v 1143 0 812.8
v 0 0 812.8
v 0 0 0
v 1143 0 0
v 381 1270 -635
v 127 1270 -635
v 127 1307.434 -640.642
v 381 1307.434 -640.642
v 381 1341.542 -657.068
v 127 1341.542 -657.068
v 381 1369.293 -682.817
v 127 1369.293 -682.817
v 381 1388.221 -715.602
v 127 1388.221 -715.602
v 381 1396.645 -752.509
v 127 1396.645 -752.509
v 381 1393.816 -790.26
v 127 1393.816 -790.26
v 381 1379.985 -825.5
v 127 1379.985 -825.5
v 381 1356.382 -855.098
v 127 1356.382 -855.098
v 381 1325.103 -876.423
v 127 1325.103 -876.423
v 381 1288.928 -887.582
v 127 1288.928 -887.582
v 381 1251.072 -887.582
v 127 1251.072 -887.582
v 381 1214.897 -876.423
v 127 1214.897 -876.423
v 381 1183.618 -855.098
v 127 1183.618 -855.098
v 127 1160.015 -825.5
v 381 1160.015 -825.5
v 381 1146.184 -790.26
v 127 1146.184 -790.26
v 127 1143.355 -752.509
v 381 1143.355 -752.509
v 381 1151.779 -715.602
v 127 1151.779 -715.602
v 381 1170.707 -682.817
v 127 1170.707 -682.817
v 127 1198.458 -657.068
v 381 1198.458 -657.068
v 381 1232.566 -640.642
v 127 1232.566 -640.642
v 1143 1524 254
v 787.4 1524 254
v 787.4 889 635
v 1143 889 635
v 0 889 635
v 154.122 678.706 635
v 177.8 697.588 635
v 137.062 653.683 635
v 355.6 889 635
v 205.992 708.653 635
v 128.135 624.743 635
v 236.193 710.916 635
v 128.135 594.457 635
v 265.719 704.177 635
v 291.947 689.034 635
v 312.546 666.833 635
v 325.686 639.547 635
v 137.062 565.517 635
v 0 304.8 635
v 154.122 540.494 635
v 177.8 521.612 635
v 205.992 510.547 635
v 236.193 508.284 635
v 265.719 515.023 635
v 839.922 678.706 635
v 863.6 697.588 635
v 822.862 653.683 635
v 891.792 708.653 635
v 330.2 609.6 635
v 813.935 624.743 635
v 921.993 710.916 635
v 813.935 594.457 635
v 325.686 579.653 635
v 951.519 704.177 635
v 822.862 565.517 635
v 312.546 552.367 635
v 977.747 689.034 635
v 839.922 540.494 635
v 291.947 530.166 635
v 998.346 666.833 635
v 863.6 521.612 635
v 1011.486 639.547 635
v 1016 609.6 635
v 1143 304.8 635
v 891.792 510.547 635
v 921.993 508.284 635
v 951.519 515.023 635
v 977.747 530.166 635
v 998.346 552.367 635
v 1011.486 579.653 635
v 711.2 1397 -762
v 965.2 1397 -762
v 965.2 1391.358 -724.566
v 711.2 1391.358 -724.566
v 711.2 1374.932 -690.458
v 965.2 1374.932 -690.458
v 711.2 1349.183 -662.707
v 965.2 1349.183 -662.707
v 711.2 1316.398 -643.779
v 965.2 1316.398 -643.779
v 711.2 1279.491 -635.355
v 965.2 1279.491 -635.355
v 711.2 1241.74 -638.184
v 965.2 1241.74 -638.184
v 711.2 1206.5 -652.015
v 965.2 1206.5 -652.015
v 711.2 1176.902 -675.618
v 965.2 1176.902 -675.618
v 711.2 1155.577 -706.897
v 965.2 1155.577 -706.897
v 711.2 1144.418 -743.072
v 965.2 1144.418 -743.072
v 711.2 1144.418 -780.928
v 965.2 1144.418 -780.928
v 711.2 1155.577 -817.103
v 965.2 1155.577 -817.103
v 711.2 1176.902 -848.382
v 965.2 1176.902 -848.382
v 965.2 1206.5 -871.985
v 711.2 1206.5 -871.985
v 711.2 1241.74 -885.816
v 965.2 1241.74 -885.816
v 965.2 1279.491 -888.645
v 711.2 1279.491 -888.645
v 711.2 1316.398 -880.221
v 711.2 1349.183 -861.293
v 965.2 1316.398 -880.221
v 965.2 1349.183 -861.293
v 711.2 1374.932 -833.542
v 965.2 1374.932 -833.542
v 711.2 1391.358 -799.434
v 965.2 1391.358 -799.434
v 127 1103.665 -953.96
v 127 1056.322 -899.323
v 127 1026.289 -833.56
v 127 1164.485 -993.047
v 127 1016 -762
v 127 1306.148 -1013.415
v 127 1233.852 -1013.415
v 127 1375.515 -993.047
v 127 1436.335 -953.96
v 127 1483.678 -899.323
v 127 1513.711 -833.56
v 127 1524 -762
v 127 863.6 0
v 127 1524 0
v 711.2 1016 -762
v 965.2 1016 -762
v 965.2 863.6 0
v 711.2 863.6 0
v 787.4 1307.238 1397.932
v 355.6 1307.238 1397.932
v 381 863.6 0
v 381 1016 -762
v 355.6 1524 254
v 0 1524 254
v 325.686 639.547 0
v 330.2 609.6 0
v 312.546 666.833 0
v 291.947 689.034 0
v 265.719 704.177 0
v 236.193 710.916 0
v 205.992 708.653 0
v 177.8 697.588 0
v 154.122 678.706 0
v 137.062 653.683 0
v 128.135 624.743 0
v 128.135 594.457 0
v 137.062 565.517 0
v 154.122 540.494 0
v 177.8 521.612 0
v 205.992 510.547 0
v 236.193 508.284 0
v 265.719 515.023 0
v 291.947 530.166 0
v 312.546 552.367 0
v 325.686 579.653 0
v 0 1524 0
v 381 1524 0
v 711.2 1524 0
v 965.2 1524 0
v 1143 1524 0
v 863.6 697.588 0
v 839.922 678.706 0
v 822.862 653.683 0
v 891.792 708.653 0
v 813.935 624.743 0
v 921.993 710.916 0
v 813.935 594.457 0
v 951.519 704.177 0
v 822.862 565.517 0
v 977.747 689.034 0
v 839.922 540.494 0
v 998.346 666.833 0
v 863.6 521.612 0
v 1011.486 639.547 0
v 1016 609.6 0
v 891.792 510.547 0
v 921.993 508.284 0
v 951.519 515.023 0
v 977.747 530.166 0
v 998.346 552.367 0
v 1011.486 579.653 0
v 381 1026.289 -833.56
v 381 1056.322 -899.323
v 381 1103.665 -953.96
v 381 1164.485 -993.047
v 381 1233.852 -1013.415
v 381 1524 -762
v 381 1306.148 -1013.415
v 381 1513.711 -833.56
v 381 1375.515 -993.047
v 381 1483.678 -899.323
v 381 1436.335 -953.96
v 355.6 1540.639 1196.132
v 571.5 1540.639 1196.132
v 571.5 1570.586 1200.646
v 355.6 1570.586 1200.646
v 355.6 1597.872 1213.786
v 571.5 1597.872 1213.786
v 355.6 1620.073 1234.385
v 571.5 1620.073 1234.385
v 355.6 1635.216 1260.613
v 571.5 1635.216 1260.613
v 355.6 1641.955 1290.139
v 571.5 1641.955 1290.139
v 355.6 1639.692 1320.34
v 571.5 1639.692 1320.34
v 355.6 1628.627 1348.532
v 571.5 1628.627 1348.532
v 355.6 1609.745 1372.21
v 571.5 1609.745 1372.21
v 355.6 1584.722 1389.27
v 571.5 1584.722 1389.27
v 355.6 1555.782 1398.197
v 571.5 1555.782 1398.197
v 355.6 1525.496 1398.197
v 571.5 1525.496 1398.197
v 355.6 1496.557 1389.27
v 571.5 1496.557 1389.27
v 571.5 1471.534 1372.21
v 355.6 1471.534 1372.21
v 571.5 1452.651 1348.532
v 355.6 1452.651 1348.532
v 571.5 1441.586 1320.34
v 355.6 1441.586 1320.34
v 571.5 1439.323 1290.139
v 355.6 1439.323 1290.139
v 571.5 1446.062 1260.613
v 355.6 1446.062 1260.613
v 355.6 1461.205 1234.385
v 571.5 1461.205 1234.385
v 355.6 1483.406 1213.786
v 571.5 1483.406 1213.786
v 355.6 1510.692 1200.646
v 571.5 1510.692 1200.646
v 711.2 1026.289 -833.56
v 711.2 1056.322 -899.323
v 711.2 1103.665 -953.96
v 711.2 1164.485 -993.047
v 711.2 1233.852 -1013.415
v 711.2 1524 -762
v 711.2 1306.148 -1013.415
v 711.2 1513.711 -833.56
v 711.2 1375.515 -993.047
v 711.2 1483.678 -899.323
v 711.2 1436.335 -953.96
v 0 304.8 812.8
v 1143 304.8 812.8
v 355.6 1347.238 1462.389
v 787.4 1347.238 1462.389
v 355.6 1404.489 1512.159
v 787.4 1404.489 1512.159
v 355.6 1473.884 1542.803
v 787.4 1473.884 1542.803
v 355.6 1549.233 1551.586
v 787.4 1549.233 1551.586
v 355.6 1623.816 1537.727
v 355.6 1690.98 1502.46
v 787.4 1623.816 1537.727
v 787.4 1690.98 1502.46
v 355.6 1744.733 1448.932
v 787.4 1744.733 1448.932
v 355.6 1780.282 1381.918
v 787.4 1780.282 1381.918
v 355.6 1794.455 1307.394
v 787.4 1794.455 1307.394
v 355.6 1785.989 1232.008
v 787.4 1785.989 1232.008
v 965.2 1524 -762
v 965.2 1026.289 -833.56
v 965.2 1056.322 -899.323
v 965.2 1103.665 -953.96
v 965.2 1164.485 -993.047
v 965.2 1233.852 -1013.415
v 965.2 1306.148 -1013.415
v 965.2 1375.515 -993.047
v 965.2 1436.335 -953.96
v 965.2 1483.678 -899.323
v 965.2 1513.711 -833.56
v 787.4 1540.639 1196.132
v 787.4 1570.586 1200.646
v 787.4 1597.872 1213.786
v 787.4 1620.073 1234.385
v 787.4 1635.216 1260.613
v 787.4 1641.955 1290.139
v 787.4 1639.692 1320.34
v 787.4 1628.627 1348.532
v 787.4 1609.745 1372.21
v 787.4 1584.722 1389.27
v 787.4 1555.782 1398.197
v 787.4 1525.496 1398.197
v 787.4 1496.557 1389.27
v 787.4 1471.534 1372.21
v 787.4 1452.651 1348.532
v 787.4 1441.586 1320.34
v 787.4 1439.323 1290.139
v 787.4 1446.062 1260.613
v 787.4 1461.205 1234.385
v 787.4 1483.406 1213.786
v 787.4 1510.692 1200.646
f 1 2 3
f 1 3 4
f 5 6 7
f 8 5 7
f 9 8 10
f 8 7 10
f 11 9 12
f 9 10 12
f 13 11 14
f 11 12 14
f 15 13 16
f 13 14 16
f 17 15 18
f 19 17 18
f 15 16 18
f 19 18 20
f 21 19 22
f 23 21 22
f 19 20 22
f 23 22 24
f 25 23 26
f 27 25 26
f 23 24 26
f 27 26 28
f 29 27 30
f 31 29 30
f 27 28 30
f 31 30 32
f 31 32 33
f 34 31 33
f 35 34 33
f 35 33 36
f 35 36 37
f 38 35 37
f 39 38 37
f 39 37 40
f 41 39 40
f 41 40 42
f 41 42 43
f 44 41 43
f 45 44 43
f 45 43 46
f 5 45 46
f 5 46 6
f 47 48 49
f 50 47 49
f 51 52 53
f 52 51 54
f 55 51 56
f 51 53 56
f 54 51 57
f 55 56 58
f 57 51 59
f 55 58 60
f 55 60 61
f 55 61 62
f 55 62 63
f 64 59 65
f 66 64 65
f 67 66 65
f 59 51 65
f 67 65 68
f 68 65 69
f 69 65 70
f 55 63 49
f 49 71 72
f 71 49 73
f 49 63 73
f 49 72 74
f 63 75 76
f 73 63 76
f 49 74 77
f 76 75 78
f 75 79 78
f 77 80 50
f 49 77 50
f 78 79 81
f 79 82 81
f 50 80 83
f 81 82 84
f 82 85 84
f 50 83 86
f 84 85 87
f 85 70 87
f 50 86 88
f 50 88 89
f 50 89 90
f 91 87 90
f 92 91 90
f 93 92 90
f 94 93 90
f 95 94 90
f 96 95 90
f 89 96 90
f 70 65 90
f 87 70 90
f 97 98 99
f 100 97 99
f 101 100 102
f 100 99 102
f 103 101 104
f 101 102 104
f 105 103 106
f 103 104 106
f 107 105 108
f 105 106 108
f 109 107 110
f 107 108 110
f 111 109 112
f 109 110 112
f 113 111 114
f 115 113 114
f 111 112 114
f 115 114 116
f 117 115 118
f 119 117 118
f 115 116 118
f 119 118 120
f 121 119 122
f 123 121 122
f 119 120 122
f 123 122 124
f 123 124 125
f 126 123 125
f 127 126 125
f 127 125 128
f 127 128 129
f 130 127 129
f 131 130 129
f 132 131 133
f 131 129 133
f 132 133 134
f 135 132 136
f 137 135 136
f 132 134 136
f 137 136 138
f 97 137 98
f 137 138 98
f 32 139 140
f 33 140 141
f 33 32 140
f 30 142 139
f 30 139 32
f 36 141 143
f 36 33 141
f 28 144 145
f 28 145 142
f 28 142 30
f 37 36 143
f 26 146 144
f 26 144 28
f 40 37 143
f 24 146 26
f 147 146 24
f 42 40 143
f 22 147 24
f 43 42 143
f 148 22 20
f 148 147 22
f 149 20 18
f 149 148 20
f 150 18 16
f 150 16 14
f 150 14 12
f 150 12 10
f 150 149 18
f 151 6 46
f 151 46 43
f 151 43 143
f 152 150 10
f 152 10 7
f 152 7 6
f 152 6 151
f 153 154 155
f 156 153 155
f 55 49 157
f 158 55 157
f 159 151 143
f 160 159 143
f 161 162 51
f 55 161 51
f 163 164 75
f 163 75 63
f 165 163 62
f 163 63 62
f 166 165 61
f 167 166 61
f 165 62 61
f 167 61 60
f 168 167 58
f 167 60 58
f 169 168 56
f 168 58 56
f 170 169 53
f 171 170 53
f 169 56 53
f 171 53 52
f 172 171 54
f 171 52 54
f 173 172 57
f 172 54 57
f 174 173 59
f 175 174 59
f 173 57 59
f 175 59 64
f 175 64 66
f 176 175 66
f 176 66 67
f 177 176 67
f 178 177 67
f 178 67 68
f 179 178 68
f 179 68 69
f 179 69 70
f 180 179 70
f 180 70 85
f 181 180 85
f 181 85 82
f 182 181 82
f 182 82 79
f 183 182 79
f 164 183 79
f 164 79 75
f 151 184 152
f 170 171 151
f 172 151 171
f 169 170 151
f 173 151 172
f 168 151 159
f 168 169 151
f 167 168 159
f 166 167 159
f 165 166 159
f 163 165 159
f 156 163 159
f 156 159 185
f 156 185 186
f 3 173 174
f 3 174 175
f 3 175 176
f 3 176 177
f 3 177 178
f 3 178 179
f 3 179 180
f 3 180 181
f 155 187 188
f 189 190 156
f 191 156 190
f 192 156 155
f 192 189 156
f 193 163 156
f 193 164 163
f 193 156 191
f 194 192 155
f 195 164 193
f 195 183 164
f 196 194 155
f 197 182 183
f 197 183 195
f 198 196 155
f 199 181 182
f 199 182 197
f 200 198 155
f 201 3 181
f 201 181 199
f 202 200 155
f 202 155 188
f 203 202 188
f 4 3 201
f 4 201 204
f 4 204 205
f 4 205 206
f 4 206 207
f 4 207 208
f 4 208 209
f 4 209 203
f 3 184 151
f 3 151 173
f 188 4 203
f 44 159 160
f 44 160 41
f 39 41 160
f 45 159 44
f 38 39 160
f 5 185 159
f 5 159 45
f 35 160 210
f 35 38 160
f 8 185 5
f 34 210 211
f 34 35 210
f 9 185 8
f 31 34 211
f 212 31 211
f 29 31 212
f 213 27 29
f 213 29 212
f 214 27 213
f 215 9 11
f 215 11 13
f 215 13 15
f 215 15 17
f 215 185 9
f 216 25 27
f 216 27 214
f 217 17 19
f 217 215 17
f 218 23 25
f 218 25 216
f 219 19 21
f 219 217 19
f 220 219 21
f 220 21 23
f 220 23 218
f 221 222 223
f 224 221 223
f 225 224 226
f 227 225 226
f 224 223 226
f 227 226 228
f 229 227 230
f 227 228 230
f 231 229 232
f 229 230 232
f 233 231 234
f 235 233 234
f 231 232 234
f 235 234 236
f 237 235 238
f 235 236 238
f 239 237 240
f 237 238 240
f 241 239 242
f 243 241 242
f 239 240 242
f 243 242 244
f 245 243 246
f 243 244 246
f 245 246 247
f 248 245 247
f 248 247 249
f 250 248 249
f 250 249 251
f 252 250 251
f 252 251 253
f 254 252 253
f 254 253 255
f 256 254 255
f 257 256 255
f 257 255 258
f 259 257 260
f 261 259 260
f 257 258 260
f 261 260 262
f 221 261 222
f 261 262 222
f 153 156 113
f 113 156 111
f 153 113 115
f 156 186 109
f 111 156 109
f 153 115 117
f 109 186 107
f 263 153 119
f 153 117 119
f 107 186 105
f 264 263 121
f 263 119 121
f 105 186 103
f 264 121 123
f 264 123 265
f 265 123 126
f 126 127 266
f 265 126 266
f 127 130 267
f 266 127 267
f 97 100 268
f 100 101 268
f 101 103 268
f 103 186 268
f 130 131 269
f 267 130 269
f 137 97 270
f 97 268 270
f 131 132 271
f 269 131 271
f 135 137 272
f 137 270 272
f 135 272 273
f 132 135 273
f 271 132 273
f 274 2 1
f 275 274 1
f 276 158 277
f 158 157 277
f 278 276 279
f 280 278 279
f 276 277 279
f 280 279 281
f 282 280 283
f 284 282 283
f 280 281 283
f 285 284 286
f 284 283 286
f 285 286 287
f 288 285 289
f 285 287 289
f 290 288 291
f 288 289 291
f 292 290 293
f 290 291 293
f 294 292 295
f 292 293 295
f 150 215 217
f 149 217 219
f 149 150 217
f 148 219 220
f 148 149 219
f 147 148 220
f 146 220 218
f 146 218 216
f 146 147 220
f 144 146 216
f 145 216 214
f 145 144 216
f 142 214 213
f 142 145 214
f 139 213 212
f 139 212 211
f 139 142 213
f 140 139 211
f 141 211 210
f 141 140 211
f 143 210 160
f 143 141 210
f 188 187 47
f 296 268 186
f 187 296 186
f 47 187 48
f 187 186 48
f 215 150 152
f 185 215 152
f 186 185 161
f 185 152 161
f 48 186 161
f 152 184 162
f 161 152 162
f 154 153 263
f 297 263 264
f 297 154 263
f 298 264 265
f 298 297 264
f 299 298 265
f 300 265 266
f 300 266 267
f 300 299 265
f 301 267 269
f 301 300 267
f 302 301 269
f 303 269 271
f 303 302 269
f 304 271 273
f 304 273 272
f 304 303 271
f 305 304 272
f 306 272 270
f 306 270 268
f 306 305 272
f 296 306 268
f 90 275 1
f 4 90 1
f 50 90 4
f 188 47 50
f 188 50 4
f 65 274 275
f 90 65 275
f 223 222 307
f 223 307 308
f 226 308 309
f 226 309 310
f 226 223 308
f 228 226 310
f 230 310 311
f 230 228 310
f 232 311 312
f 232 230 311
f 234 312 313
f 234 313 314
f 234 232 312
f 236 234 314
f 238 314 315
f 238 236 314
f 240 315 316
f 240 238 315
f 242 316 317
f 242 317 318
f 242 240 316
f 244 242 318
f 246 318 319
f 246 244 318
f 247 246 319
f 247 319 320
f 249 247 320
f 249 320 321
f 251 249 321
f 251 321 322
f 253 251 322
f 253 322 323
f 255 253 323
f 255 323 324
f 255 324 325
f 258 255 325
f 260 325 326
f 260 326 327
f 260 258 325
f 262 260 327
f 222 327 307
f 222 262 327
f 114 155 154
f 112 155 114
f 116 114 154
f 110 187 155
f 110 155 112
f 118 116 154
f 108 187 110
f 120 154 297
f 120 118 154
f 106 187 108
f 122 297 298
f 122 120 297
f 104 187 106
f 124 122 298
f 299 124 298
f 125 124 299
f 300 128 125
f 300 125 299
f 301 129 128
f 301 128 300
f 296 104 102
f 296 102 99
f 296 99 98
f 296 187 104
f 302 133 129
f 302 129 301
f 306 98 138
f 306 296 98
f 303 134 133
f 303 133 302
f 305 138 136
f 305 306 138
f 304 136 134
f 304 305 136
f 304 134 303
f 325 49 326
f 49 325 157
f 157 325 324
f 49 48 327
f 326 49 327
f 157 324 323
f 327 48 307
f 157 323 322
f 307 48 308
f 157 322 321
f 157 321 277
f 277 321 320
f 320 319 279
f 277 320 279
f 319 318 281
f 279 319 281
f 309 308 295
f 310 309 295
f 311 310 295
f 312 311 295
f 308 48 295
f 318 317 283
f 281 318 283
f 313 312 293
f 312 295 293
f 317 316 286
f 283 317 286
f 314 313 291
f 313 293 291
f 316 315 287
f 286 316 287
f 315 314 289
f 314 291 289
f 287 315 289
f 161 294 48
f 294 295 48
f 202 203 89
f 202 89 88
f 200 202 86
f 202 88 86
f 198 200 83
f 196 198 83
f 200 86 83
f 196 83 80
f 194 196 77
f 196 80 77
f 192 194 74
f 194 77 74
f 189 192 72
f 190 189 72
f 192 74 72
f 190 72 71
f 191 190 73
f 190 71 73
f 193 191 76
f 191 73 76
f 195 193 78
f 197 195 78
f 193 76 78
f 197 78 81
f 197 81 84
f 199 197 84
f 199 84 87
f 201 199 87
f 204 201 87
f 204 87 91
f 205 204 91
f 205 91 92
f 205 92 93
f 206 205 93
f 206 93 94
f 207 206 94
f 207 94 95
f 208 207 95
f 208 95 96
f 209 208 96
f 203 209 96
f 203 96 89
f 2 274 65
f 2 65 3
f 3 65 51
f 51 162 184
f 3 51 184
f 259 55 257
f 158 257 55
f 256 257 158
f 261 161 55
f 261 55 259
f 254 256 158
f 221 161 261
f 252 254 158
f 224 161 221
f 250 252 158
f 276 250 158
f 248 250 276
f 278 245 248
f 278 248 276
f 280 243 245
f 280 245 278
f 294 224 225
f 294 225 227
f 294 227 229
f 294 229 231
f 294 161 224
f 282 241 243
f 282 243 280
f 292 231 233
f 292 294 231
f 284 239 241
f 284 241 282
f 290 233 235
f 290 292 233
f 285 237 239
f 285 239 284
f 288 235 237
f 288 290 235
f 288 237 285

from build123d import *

# Parameters (mm, degrees)
SKETCH1_W                 = 1143
SKETCH1_H                 = 635
BOSS_EXTRUDE1_DEPTH       = 584.2
SKETCH2_W                 = 1143
SKETCH2_H                 = 177.8
BOSS_EXTRUDE2_DEPTH       = 304.8
SKETCH4_W                 = 1143
SKETCH4_H                 = 635
BOSS_EXTRUDE3_DEPTH       = 304.8
SKETCH5_W                 = 254
SKETCH5_H                 = 1524
BOSS_EXTRUDE4_DEPTH       = 1143
BOSS_EXTRUDE5_DEPTH       = 1143
SKETCH8_W                 = 254
SKETCH8_H                 = 762
BOSS_EXTRUDE6_DEPTH       = 660.4
BOSS_EXTRUDE7_DEPTH       = 254
SKETCH10_R                = 127
CUT_EXTRUDE2_DEPTH        = 254
CUT_EXTRUDE3_DEPTH        = 254
SKETCH12_W                = 254
SKETCH12_H                = 762
BOSS_EXTRUDE8_DEPTH       = 660.4
SKETCH13_R                = 254
SKETCH13_R_2              = 127
BOSS_EXTRUDE9_DEPTH       = 254
SKETCH14_R                = 127
CUT_EXTRUDE4_DEPTH        = 254
SKETCH15_R                = 101.6
CUT_EXTRUDE5_DEPTH        = 1652
SKETCH16_R                = 101.6
BOSS_EXTRUDE10_DEPTH      = 215.9
BOSS_EXTRUDE10_DEPTH_BACK = 215.9


with BuildPart() as part:
    # Sketch1 → Boss-Extrude1 (new body)
    with BuildSketch(Plane(origin=(0, 0, 0), x_dir=(1, 0, 0), z_dir=(0, 1, 0))):
        with Locations((571.5, -317.5)):
            Rectangle(SKETCH1_W, SKETCH1_H)
    extrude(amount=BOSS_EXTRUDE1_DEPTH)

    # Sketch2 → Boss-Extrude2 (add)
    with BuildSketch(Plane.XZ):
        with Locations((571.5, 723.9)):
            Rectangle(SKETCH2_W, SKETCH2_H)
    extrude(amount=-BOSS_EXTRUDE2_DEPTH)

    # Sketch4 → Boss-Extrude3 (add)
    with BuildSketch(Plane(origin=(0, 584.2, 0), x_dir=(1, 0, 0), z_dir=(0, 1, 0))):
        with Locations((571.5, -317.5)):
            Rectangle(SKETCH4_W, SKETCH4_H)
    extrude(amount=BOSS_EXTRUDE3_DEPTH)

    # Sketch5 → Boss-Extrude4 (add)
    with BuildSketch(Plane.ZY):
        with Locations((127, 762)):
            Rectangle(SKETCH5_W, SKETCH5_H)
    extrude(amount=-BOSS_EXTRUDE4_DEPTH)

    # Sketch6 → Boss-Extrude5 (add)
    with BuildSketch(Plane.ZY):
        Polygon((254, 1524), (635, 889), (254, 889), align=None)
    extrude(amount=-BOSS_EXTRUDE5_DEPTH)

    # Sketch8 → Boss-Extrude6 (add)
    with BuildSketch(Plane(origin=(0, 1524, 0), x_dir=(1, 0, 0), z_dir=(0, 1, 0))):
        with Locations((254, 381)):
            Rectangle(SKETCH8_W, SKETCH8_H)
    extrude(amount=-BOSS_EXTRUDE6_DEPTH)

    # Sketch9 → Boss-Extrude7 (add)
    with BuildSketch(Plane.ZY.offset(-127)):
        with BuildLine():
            ThreePointArc((-508, 1270), (-582.394877579, 1449.605122421), (-762, 1524))
            Line((-762, 1524), (-762, 1397))
            ThreePointArc((-762, 1397), (-672.197438789, 1359.802561211), (-635, 1270))
            ThreePointArc((-635, 1270), (-672.197438789, 1180.197438789), (-762, 1143))
            Line((-762, 1143), (-762, 1016))
            ThreePointArc((-762, 1016), (-582.394877579, 1090.394877579), (-508, 1270))
        make_face()
        with BuildLine():
            Line((-762, 1397), (-762, 1524))
            ThreePointArc((-762, 1524), (-1016, 1270), (-762, 1016))
            Line((-762, 1016), (-762, 1143))
            ThreePointArc((-762, 1143), (-889, 1270), (-762, 1397))
        make_face()
    extrude(amount=-BOSS_EXTRUDE7_DEPTH)

    # Sketch10 → Cut-Extrude2 (cut)
    with BuildSketch(Plane.ZY.offset(-127)):
        with Locations((-762, 1270)):
            Circle(SKETCH10_R)
    extrude(amount=-CUT_EXTRUDE2_DEPTH, mode=Mode.SUBTRACT)

    # Sketch11 → Cut-Extrude3 (cut)
    with BuildSketch(Plane.ZY.offset(-127)):
        Polygon((-762, 863.6), (0, 863.6), (-762, 1016), align=None)
    extrude(amount=-CUT_EXTRUDE3_DEPTH, mode=Mode.SUBTRACT)

    # Sketch12 → Boss-Extrude8 (add)
    with BuildSketch(Plane(origin=(0, 1524, 0), x_dir=(1, 0, 0), z_dir=(0, 1, 0))):
        with Locations((838.2, 381)):
            Rectangle(SKETCH12_W, SKETCH12_H)
    extrude(amount=-BOSS_EXTRUDE8_DEPTH)

    # Sketch13 → Boss-Extrude9 (add)
    with BuildSketch(Plane(origin=(965.2, 0, 0), x_dir=(0, 0, -1), z_dir=(1, 0, 0))):
        with Locations((762, 1270)):
            Circle(SKETCH13_R)
        with Locations((762, 1270)):
            Circle(SKETCH13_R_2, mode=Mode.SUBTRACT)
    extrude(amount=-BOSS_EXTRUDE9_DEPTH)

    # Sketch14 → Cut-Extrude4 (cut)
    with BuildSketch(Plane(origin=(965.2, 0, 0), x_dir=(0, 0, -1), z_dir=(1, 0, 0))):
        with Locations((762, 1270)):
            Circle(SKETCH14_R)
        Polygon((762, 1016), (0, 863.6), (762, 863.6), align=None)
    extrude(amount=-CUT_EXTRUDE4_DEPTH, mode=Mode.SUBTRACT)

    # Sketch15 → Cut-Extrude5 (cut, through all)
    with BuildSketch(Plane.XY.offset(635)):
        with Locations((914.4, 609.6)):
            Circle(SKETCH15_R)
        with Locations((228.6, 609.6)):
            Circle(SKETCH15_R)
    extrude(amount=-CUT_EXTRUDE5_DEPTH, mode=Mode.SUBTRACT)

    # Sketch16 → Boss-Extrude10 (add, two sides)
    with BuildSketch(Plane(origin=(571.5, 0, 0), x_dir=(0, 0, -1), z_dir=(1, 0, 0))) as boss_extrude10_sk:
        with BuildLine():
            Line((-635, 889), (-1397.931735388, 1307.238213289))
            ThreePointArc((-1397.931735388, 1307.238213289), (-1537.726937635, 1623.815968567), (-1232.007743802, 1785.988556358))
            Line((-1232.007743802, 1785.988556358), (-254, 1524))
            Line((-254, 1524), (-635, 889))
        make_face()
        with Locations((-1297.731905002, 1540.639143001)):
            Circle(SKETCH16_R, mode=Mode.SUBTRACT)
    extrude(amount=BOSS_EXTRUDE10_DEPTH)
    extrude(boss_extrude10_sk.sketch, amount=-BOSS_EXTRUDE10_DEPTH_BACK)


solid = part.part
